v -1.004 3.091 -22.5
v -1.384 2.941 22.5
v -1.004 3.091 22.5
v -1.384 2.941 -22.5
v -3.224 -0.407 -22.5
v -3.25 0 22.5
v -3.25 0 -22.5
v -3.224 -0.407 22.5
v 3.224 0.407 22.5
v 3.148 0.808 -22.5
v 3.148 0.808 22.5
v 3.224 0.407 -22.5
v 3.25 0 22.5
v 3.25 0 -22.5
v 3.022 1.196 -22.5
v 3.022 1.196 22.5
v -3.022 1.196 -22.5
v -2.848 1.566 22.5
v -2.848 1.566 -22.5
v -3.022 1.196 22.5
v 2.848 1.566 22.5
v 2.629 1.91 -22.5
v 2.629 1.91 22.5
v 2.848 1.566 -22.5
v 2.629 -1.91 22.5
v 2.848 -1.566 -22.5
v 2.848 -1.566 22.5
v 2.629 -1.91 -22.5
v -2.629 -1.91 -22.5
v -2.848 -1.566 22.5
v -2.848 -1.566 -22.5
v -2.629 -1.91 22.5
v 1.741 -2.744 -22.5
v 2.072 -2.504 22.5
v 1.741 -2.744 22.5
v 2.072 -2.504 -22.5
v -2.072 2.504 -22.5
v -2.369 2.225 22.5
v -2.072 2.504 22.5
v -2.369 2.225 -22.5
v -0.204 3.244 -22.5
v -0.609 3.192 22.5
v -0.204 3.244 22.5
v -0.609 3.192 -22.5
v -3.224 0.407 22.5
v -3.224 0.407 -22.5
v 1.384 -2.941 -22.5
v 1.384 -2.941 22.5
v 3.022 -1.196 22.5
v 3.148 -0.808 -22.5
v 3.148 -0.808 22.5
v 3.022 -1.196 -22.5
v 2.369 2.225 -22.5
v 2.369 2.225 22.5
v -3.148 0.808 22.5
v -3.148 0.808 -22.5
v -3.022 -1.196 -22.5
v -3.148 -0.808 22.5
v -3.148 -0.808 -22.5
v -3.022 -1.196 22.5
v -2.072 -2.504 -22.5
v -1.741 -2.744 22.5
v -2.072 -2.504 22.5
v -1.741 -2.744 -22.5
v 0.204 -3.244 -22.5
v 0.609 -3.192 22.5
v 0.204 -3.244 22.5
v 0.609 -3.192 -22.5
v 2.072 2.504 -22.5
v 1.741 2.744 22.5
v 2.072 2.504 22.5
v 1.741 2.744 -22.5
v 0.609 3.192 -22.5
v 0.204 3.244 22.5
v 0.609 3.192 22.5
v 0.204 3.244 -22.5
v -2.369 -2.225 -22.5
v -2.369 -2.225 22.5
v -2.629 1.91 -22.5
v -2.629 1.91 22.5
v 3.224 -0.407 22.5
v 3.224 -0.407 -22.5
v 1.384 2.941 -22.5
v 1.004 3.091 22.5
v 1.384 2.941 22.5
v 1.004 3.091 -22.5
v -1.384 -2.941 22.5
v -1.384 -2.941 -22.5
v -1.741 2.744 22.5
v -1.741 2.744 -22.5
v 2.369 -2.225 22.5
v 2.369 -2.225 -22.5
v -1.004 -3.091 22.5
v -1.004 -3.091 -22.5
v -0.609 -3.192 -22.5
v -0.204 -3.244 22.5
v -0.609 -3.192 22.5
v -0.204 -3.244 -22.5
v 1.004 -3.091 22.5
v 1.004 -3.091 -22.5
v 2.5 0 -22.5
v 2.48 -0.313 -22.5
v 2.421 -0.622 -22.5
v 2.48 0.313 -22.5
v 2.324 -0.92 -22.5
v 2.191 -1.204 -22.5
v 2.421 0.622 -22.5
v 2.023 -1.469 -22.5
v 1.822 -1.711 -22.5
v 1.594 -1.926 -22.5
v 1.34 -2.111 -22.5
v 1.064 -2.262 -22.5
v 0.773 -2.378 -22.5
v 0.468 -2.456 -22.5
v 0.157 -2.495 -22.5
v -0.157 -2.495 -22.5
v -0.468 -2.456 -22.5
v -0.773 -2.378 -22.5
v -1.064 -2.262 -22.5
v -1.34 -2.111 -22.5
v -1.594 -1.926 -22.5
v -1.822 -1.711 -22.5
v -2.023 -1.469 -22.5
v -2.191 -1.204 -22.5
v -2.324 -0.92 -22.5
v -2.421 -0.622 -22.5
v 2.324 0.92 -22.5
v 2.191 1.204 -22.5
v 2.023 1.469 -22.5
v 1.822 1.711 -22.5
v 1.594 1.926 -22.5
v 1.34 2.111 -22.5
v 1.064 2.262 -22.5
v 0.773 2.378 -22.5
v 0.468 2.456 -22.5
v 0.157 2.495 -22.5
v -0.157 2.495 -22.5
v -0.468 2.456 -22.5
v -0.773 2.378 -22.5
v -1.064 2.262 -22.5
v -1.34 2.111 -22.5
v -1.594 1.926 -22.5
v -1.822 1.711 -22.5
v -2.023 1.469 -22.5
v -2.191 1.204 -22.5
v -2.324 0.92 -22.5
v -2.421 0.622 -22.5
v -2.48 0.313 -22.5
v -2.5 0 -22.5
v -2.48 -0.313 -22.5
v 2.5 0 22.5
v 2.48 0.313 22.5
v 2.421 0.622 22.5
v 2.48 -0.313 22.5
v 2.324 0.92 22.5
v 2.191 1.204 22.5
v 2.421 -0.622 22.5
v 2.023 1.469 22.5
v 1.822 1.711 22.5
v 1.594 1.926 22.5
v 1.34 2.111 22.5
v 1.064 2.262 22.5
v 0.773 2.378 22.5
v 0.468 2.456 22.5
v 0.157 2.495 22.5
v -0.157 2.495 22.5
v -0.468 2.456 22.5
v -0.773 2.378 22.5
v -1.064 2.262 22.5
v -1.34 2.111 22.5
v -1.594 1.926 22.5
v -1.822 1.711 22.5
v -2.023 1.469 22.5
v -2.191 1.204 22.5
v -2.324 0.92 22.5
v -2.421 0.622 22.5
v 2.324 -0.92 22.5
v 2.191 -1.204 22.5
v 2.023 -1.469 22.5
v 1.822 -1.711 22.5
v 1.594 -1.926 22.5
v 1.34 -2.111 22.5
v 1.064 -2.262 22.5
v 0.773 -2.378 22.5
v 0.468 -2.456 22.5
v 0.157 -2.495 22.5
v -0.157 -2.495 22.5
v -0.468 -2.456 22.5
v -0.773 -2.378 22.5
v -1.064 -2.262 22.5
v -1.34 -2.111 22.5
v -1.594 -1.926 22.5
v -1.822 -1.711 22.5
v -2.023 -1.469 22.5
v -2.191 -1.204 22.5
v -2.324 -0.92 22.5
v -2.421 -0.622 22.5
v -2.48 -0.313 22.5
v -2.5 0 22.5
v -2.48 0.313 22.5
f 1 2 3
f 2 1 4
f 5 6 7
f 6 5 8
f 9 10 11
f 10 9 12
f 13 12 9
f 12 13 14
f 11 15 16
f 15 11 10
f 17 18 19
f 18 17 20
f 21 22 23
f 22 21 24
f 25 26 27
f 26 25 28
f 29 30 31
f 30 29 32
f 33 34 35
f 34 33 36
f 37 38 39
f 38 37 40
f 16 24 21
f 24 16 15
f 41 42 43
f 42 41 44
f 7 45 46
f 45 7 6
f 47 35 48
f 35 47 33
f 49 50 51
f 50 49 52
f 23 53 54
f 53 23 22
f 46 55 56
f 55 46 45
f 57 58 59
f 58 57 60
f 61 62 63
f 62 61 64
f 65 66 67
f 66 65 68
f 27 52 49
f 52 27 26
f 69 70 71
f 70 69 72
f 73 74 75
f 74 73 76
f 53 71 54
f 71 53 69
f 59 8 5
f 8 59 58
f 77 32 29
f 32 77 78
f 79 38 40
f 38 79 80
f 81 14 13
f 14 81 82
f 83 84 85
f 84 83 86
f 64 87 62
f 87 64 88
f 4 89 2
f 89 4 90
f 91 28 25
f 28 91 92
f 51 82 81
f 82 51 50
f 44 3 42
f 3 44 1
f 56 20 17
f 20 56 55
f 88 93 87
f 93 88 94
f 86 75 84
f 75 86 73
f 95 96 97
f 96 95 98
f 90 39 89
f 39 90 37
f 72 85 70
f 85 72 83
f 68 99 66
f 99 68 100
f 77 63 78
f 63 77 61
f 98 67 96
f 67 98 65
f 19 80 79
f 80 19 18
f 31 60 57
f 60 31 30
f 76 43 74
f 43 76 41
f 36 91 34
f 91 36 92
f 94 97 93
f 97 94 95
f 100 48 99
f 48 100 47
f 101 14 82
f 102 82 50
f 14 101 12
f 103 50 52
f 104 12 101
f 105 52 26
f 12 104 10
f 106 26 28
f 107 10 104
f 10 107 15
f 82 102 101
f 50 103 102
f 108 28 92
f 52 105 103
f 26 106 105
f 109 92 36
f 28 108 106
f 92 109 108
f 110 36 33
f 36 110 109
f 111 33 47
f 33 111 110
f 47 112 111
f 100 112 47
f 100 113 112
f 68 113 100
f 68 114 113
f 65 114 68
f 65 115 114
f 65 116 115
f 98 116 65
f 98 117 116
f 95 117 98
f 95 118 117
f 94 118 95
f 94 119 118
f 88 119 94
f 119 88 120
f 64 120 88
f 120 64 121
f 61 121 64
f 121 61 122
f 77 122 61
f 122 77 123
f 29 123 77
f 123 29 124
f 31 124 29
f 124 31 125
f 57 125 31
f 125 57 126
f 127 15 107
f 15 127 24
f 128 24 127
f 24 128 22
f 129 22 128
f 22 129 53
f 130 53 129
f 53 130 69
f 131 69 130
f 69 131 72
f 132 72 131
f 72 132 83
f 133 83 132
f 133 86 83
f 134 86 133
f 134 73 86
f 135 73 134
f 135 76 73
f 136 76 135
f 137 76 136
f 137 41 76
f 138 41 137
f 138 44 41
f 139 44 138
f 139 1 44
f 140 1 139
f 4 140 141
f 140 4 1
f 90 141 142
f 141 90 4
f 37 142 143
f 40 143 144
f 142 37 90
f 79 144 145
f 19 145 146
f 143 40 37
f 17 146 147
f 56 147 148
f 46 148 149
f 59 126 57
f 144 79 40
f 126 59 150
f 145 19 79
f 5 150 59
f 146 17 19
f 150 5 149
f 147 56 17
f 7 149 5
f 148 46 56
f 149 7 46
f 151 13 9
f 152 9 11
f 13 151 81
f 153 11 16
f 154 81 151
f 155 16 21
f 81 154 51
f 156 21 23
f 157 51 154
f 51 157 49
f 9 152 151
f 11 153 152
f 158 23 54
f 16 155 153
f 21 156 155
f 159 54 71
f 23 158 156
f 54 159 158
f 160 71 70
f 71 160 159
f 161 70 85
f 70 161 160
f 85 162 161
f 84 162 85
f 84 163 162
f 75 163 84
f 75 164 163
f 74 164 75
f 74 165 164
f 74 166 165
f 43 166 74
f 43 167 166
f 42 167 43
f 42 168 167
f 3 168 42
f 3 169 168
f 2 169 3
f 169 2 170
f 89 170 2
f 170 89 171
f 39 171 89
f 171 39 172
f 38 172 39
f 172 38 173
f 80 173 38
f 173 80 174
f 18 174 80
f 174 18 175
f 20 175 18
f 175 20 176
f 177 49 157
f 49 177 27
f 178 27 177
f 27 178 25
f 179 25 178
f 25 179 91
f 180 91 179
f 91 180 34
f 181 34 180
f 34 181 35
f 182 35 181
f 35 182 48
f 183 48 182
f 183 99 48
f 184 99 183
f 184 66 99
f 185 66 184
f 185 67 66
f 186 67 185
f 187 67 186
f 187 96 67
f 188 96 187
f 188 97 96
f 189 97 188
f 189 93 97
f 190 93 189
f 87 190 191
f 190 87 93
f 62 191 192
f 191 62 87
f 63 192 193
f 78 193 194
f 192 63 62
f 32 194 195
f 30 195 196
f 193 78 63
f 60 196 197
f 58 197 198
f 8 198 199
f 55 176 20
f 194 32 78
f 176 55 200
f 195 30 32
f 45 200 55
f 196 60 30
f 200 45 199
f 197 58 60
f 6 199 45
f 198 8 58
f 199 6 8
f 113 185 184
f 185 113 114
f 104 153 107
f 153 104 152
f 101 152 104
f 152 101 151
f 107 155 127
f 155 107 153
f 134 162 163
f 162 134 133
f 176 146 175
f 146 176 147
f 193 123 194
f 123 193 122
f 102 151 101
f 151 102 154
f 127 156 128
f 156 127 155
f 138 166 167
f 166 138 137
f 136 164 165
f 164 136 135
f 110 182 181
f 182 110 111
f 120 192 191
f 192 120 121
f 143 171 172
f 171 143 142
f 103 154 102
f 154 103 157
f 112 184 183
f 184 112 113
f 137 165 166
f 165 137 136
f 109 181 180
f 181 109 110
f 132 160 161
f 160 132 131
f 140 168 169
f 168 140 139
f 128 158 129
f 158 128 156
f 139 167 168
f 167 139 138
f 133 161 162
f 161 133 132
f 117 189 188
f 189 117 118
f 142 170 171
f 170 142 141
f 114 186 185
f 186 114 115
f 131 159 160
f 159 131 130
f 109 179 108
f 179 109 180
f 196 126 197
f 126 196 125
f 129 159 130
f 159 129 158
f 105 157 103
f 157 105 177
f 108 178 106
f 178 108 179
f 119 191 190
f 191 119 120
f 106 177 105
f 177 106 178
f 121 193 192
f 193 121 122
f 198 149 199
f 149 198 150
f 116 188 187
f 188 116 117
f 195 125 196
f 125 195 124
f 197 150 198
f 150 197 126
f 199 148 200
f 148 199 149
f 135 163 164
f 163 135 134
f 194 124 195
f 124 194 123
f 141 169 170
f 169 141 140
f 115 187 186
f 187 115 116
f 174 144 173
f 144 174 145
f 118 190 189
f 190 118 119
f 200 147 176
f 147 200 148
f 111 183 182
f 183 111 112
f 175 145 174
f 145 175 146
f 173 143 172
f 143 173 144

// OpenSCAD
$fn = 50;


difference() {
	union() {
		translate(v = [0, 0, -22.5000000000]) {
			cylinder(h = 45, r = 3.2500000000);
		}
	}
	union() {
		translate(v = [0, 0, -100.0000000000]) {
			cylinder(h = 200, r = 2.5000000000);
		}
	}
}
